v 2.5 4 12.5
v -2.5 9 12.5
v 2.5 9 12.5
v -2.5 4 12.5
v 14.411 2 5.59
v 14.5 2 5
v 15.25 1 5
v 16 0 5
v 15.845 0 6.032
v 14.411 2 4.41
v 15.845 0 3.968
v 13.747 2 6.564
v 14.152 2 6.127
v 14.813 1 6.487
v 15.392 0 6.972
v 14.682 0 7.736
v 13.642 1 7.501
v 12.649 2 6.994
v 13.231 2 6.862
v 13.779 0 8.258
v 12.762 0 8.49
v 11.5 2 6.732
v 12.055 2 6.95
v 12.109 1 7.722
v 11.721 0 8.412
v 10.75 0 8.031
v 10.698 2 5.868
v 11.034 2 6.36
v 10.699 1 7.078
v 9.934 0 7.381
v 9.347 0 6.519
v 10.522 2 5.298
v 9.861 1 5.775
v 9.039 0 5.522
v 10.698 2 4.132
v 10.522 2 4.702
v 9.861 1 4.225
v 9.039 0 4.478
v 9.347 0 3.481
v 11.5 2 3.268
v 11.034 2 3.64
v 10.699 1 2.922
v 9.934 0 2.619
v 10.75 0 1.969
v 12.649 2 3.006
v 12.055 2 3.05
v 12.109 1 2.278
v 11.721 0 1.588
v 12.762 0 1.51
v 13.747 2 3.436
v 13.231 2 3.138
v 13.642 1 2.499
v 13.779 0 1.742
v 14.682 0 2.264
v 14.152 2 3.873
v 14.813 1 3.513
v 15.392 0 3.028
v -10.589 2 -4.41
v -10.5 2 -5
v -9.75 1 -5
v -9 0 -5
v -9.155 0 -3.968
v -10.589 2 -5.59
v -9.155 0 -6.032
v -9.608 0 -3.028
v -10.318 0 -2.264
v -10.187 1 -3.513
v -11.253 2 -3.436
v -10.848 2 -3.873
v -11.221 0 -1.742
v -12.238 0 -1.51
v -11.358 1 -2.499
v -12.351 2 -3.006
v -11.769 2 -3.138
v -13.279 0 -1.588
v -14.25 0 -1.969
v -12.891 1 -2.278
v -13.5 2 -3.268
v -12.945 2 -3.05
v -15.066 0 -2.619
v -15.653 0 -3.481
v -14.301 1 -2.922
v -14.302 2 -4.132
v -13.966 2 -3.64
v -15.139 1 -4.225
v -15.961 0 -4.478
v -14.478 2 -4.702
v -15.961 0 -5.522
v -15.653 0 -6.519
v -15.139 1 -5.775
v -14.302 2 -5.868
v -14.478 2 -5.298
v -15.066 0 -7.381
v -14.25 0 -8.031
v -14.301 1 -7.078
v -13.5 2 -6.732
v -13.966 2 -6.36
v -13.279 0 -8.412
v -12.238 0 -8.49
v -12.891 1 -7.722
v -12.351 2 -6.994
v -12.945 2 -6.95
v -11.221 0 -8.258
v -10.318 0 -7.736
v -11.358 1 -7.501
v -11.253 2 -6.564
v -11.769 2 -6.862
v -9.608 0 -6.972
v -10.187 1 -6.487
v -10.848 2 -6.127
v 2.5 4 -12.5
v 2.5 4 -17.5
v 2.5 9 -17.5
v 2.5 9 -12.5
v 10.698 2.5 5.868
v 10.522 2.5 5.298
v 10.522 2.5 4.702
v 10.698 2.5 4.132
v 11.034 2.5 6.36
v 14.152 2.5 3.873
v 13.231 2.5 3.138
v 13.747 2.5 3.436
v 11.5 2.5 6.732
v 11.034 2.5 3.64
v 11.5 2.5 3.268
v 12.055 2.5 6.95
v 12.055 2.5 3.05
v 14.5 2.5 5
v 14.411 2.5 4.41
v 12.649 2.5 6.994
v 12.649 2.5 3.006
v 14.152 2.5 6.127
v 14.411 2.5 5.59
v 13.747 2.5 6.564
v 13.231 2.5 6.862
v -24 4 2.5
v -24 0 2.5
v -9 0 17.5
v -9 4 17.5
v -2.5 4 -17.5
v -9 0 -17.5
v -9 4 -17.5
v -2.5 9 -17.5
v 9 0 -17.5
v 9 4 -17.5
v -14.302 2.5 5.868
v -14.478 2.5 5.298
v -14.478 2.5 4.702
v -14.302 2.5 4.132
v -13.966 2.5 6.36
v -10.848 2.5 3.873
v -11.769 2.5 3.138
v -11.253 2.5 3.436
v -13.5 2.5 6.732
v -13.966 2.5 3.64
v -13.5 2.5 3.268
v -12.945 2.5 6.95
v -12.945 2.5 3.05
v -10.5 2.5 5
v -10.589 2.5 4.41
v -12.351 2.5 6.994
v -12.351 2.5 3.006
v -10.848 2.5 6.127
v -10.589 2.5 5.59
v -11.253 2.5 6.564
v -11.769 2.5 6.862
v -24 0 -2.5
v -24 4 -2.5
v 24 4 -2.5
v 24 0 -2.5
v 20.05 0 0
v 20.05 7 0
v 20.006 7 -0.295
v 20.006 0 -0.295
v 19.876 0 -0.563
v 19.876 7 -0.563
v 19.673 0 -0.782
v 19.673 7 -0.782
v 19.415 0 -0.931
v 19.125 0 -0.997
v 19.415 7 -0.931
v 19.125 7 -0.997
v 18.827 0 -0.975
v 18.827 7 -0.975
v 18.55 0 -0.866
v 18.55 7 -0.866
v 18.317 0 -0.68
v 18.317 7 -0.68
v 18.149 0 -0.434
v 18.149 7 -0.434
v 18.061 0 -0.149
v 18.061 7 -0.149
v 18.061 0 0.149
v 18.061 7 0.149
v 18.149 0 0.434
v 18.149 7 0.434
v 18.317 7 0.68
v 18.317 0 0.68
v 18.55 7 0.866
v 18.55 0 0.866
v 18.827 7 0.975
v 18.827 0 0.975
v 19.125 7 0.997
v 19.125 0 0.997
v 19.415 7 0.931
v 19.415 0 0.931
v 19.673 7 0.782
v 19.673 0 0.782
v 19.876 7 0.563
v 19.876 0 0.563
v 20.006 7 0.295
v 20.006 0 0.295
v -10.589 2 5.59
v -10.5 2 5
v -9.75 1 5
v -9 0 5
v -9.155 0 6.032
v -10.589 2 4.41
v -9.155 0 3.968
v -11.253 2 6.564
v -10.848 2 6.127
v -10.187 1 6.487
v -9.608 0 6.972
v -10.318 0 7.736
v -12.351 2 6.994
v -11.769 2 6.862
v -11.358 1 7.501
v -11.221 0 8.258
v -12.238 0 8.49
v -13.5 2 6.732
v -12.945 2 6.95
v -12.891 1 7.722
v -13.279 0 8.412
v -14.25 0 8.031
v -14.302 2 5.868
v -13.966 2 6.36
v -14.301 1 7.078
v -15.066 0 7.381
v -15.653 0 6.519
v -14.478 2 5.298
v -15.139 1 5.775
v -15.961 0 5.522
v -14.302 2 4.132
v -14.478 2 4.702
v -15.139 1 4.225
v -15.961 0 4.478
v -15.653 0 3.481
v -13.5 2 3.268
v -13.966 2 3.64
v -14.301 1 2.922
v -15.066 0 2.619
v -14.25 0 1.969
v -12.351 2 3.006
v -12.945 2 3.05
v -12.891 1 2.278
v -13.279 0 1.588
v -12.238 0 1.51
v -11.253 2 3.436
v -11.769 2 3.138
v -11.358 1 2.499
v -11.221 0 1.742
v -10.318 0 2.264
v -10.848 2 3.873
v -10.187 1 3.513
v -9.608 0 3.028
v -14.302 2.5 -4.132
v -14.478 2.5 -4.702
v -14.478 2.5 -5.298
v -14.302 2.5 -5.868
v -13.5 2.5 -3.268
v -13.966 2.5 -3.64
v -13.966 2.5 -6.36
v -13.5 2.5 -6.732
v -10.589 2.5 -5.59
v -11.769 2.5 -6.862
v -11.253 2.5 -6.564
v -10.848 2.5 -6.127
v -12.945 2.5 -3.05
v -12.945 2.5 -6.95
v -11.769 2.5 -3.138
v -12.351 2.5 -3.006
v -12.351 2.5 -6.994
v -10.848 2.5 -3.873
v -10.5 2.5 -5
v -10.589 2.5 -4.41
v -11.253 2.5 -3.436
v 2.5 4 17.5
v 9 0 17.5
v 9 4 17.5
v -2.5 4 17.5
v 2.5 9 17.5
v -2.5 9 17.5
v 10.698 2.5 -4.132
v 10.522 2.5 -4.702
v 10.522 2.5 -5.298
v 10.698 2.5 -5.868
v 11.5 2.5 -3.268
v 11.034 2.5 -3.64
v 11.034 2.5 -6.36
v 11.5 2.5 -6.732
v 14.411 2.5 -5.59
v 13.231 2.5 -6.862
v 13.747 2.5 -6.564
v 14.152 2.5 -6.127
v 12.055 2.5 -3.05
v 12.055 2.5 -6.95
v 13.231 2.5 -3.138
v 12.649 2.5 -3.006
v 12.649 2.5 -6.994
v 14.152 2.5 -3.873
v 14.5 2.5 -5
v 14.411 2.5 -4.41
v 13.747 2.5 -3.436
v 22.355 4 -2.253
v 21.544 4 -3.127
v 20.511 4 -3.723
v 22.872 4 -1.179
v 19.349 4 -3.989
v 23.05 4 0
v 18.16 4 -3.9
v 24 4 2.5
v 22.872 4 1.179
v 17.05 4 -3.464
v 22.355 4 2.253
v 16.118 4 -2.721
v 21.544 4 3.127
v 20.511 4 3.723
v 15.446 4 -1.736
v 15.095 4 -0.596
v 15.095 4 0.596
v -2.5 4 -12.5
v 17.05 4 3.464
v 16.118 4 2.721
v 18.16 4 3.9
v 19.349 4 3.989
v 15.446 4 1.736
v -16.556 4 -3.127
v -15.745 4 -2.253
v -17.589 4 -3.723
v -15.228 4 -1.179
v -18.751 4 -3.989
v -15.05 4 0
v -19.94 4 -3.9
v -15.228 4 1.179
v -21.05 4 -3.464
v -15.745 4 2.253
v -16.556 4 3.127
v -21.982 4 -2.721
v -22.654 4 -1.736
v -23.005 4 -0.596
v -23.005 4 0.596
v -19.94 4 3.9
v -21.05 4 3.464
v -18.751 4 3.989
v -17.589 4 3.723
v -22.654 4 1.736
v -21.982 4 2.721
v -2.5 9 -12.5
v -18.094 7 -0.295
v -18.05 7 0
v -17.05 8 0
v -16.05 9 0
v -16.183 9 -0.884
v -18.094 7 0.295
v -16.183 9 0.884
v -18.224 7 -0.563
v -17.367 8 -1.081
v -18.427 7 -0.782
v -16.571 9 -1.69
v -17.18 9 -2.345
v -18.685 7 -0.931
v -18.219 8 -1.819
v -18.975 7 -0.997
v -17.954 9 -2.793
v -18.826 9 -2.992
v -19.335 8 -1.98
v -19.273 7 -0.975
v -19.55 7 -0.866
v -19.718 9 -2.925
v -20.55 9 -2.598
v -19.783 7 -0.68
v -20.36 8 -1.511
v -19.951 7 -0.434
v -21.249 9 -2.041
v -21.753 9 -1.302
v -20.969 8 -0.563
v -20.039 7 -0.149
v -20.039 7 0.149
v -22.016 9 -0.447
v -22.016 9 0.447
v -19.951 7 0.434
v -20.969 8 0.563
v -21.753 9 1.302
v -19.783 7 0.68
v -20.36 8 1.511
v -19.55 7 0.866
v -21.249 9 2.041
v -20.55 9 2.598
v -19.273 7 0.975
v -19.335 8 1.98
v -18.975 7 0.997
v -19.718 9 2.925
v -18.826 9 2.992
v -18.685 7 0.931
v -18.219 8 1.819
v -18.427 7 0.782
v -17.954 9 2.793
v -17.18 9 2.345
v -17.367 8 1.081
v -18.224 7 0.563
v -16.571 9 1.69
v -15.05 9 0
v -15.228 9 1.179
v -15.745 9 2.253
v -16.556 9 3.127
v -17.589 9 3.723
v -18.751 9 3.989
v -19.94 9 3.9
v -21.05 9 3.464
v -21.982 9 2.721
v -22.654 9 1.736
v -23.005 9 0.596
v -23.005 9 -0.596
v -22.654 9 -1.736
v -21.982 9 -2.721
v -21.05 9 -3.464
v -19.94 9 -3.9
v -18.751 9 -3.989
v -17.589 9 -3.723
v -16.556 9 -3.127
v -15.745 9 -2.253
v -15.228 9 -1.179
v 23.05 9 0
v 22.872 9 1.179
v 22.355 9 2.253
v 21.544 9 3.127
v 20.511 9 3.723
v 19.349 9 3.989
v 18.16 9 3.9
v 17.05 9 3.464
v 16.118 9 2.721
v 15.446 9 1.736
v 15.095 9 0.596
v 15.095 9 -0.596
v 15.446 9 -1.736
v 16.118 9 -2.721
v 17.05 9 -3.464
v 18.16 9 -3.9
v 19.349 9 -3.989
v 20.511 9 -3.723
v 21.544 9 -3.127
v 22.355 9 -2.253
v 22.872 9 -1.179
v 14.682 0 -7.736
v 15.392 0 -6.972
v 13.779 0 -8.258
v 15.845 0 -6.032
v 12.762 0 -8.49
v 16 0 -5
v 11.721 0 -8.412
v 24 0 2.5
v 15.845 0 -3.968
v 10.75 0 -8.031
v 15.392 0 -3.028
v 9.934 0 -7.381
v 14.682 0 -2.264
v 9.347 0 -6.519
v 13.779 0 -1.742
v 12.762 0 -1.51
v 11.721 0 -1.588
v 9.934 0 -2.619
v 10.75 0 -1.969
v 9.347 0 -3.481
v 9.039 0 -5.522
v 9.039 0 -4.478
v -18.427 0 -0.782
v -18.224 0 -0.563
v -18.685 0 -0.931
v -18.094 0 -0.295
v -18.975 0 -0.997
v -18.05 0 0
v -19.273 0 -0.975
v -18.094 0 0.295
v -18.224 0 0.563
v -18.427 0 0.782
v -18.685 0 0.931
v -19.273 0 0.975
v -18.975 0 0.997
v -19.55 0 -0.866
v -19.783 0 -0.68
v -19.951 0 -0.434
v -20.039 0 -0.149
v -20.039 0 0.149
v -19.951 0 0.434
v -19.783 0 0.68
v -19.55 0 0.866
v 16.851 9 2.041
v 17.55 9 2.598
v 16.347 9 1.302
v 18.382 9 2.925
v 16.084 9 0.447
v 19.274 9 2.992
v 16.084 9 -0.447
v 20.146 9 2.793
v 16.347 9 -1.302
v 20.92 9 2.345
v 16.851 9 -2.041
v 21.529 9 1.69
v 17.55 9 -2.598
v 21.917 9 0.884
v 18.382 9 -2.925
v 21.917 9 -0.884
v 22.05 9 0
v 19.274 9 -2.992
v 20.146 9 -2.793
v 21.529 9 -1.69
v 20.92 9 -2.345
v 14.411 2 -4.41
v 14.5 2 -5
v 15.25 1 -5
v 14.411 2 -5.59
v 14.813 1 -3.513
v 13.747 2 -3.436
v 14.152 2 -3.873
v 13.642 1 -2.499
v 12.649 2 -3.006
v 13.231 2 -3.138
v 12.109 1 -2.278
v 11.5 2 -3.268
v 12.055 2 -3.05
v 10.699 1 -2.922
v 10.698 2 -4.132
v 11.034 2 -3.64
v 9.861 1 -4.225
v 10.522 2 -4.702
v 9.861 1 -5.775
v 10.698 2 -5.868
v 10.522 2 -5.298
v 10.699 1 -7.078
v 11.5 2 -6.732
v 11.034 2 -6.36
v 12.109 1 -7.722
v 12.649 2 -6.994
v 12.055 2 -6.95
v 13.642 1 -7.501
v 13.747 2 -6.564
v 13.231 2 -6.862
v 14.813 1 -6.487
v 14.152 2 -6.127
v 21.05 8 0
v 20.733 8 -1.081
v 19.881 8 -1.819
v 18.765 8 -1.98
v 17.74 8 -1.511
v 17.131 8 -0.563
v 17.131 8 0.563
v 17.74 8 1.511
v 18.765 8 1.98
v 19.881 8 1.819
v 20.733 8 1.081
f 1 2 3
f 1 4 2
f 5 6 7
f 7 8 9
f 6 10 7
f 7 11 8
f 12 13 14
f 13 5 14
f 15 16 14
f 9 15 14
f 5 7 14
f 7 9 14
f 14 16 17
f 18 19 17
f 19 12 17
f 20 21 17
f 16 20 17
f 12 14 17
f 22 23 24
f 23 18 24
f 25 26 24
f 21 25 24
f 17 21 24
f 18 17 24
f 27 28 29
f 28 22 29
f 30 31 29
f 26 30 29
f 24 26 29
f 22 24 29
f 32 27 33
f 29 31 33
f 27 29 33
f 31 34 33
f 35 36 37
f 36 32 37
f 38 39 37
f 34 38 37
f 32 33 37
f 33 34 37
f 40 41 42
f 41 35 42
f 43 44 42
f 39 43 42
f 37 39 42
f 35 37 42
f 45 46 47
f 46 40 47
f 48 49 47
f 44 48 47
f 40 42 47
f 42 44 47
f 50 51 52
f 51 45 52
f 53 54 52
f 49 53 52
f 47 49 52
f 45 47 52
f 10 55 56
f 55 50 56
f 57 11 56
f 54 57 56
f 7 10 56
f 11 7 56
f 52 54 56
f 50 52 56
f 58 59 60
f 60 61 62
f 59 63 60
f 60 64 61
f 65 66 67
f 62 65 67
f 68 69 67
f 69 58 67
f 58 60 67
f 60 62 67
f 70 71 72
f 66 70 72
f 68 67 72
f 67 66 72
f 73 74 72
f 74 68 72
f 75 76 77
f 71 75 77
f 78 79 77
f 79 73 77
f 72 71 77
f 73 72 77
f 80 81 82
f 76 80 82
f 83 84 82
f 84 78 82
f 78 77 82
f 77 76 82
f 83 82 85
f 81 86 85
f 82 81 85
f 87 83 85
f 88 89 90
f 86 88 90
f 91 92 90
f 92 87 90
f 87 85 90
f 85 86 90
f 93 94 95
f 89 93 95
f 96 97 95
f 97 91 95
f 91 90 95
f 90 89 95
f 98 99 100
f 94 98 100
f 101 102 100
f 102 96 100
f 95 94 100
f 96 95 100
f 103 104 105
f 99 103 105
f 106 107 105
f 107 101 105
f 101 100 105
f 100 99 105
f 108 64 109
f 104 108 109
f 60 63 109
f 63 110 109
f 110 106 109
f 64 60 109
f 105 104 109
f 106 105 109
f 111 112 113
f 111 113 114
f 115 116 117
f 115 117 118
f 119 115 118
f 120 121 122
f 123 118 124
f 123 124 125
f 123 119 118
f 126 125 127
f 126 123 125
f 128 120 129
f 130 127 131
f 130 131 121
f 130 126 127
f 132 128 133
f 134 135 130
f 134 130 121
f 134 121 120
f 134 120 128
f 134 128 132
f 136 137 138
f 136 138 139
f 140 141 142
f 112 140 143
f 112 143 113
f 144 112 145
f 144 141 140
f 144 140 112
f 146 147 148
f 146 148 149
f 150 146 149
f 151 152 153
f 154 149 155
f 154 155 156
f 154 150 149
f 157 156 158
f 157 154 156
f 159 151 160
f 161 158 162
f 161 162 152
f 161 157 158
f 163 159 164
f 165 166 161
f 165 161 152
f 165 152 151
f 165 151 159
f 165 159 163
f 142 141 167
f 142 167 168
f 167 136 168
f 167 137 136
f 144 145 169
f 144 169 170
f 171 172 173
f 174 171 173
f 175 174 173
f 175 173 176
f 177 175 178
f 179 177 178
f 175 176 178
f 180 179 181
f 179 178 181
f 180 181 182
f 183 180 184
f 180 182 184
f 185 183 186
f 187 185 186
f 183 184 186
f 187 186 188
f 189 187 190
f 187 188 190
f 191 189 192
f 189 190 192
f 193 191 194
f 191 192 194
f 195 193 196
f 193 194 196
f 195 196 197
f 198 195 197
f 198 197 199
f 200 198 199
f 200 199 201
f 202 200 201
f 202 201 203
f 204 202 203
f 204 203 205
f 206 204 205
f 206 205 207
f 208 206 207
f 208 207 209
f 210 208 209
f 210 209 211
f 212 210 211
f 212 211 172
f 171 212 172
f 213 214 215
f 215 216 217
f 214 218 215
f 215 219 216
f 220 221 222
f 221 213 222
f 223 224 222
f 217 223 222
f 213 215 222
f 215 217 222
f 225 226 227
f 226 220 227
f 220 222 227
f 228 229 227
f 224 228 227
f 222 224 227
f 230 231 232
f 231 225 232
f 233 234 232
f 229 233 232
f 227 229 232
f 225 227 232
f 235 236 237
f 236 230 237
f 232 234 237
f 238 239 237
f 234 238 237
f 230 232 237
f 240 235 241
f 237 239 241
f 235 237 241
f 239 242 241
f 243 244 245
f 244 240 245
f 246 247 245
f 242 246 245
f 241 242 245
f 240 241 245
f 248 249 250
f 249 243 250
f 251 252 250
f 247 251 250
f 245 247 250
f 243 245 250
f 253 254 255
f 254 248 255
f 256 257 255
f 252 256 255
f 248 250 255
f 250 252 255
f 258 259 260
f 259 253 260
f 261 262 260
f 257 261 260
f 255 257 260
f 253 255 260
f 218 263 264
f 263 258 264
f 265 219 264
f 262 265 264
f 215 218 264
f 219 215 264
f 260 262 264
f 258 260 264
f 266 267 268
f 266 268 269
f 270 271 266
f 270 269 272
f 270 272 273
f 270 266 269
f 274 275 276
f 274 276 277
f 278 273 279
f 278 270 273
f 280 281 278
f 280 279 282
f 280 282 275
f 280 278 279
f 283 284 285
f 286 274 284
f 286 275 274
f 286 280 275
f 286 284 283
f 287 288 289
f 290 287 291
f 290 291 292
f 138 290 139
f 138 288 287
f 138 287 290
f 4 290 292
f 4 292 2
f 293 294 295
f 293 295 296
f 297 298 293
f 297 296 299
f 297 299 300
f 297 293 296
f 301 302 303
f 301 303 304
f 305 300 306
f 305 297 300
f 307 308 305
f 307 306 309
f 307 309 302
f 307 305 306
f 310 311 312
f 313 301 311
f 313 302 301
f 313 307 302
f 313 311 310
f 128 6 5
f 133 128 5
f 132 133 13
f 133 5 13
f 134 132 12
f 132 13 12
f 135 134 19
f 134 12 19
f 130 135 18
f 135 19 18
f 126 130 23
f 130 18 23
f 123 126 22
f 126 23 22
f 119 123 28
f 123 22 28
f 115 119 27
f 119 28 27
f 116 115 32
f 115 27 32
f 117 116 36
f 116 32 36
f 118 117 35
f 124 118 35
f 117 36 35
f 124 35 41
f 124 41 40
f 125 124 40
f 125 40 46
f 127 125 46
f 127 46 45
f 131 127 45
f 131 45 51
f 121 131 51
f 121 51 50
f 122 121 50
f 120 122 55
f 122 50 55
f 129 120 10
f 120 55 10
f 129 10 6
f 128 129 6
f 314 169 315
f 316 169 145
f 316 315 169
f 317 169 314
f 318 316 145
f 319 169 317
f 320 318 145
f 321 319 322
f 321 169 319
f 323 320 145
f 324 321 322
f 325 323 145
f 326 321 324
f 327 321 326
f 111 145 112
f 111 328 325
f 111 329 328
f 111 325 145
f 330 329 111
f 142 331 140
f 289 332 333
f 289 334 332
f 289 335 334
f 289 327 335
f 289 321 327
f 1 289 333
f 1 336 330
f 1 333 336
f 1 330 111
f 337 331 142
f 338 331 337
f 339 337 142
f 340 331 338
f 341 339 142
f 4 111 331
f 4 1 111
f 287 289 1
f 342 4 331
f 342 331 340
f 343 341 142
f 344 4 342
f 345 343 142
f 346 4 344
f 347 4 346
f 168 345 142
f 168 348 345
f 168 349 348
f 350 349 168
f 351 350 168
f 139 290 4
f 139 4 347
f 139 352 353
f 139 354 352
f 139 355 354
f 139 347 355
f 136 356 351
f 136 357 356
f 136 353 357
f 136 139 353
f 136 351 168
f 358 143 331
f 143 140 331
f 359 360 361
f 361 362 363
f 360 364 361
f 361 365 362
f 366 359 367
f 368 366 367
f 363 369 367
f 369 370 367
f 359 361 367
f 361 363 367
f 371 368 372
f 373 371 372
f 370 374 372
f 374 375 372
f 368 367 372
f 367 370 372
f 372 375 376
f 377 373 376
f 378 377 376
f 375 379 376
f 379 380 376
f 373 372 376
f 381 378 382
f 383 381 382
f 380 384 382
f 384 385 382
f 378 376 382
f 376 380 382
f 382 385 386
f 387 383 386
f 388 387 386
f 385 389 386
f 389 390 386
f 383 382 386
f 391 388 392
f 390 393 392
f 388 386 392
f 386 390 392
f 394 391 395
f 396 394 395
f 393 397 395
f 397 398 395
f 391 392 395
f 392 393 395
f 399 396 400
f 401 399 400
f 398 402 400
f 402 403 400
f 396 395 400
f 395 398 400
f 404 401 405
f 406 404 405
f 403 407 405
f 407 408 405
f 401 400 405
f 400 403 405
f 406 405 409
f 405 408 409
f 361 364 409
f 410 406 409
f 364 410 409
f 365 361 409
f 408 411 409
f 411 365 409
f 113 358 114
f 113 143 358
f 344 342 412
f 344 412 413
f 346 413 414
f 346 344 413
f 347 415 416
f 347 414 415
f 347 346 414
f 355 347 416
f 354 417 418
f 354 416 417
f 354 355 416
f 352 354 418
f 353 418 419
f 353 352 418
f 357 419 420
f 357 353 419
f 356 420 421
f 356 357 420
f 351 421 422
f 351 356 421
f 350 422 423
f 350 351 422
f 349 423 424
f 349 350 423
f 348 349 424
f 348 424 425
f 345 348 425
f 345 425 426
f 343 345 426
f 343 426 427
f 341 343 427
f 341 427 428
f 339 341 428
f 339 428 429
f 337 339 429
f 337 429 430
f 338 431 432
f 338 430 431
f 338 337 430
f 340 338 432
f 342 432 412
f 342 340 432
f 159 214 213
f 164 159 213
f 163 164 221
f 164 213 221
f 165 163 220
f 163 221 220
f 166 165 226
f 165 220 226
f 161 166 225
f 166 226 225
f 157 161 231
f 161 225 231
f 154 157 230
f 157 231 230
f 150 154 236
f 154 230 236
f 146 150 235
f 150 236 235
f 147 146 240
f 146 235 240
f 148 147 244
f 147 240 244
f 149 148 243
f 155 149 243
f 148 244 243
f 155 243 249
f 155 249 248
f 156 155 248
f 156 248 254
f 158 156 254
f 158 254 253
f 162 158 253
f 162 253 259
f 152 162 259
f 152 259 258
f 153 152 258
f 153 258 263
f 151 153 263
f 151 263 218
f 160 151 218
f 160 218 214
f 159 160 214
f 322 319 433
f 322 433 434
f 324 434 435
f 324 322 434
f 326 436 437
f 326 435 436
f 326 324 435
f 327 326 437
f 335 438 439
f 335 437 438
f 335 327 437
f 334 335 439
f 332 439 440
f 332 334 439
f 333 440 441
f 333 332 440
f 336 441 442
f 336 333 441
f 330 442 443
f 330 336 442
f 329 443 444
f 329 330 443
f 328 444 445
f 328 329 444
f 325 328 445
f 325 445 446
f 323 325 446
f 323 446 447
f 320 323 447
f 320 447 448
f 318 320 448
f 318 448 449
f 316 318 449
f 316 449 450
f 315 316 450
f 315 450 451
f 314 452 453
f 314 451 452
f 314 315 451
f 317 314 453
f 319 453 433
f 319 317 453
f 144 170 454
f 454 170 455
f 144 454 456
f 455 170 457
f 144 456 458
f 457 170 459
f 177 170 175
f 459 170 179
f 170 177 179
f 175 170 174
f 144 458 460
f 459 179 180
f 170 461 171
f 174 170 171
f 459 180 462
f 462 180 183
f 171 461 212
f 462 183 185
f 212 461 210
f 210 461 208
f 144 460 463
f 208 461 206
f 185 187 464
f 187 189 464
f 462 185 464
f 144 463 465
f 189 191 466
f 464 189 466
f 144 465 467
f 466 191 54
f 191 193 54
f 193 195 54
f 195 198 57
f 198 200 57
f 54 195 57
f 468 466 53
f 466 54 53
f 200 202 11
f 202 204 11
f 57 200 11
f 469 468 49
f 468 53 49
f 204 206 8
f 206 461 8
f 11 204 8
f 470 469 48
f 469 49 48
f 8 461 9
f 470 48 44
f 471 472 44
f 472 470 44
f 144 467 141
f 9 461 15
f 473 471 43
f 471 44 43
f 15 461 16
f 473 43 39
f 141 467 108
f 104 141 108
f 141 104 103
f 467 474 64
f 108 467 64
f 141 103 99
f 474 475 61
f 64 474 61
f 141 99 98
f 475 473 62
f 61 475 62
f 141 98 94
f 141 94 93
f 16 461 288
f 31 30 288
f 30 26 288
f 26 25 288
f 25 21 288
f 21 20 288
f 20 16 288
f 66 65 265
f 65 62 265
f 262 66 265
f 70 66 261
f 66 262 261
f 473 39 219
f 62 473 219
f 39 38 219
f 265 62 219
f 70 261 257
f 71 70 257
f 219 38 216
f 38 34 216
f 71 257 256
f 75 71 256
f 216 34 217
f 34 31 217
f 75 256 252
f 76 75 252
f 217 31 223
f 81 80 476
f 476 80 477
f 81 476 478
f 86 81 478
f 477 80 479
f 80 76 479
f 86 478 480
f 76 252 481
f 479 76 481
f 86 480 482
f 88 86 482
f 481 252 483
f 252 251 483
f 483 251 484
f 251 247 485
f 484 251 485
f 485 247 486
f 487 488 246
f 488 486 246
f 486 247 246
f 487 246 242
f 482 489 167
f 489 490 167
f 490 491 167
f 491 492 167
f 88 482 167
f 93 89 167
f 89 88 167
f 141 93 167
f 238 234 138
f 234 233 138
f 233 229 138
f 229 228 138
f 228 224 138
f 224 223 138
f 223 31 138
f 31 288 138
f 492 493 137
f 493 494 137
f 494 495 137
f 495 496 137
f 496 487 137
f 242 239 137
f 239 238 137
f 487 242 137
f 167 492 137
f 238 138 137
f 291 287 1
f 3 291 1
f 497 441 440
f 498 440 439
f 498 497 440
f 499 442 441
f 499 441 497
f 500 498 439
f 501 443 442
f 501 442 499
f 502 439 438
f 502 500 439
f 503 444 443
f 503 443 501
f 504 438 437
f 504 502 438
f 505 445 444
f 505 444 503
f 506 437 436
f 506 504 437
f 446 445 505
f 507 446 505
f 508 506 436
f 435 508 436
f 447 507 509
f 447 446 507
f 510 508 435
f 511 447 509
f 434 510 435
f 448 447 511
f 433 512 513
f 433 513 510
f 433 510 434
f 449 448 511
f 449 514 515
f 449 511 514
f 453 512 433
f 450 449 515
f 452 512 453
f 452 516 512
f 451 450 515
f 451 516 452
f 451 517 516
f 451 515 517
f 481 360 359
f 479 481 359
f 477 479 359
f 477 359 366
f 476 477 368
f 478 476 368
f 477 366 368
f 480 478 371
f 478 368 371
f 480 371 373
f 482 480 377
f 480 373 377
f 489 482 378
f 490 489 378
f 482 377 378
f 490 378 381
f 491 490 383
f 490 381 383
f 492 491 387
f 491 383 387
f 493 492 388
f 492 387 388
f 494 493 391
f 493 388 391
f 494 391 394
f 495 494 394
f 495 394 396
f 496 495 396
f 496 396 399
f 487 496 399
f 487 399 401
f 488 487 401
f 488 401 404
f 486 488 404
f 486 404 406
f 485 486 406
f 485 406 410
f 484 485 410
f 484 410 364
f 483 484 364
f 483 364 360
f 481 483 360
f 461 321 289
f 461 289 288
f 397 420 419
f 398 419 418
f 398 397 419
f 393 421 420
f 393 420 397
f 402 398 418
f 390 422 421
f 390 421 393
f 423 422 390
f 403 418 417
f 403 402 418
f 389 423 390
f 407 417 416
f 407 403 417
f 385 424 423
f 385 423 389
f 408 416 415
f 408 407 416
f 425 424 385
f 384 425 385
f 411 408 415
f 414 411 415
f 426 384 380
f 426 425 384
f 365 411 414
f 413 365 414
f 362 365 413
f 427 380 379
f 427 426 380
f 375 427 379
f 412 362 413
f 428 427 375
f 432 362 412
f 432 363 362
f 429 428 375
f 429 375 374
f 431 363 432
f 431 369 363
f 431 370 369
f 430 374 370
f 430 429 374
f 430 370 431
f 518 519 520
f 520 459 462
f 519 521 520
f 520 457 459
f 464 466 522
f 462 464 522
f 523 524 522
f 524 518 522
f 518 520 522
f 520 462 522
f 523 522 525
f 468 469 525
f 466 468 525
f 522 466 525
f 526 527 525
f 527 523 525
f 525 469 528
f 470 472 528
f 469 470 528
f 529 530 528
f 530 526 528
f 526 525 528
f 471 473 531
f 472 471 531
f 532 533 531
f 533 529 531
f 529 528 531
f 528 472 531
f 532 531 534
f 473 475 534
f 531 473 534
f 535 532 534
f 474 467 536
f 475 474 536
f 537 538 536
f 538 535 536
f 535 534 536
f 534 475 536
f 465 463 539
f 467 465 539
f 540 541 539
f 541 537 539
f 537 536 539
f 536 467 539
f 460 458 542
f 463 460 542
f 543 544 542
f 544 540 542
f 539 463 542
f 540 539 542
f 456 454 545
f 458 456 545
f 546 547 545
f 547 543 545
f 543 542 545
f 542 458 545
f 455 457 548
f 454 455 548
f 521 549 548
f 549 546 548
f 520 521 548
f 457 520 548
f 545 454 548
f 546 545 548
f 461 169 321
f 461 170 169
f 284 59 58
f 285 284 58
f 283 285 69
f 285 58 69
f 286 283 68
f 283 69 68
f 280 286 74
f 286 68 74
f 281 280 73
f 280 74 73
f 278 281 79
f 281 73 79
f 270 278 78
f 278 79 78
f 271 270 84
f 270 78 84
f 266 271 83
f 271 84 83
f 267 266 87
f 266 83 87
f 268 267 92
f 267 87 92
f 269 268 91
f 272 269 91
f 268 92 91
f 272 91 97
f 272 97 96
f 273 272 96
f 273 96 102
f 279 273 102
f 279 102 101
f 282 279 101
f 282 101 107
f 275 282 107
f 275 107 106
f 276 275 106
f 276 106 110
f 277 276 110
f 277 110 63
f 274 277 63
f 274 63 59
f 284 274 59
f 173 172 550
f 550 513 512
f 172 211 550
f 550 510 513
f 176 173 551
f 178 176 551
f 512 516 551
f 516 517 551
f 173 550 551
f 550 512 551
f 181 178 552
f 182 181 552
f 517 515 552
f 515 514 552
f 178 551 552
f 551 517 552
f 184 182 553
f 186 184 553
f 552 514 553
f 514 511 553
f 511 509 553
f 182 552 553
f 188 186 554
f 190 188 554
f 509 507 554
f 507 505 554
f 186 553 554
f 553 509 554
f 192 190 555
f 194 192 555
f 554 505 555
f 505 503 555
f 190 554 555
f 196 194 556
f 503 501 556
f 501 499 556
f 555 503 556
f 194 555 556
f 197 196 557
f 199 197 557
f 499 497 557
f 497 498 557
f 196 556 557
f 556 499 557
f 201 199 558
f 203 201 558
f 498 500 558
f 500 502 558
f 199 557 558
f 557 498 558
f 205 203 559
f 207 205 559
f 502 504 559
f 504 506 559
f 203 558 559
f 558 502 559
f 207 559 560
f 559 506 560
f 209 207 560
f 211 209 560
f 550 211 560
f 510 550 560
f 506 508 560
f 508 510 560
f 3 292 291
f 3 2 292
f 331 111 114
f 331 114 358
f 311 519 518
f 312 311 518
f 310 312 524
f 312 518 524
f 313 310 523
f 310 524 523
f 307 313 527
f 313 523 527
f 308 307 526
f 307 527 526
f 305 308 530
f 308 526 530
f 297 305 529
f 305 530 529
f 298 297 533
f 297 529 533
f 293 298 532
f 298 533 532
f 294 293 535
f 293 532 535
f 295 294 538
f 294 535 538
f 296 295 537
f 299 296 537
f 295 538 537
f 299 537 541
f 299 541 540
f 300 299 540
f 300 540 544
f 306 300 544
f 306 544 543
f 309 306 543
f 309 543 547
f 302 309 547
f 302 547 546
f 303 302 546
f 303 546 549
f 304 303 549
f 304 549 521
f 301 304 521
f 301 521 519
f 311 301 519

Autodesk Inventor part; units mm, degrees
ref_plane "YZ Plane" through (0, 0, 0) normal (1, 0, 0) x (0, 1, 0)
ref_plane "XZ Plane" through (0, 0, 0) normal (0, 1, 0) x (-1, 0, 0)
ref_plane "XY Plane" through (0, 0, 0) normal (0, 0, 1) x (1, 0, 0)
sketch "Sketch1" plane through (0, 0, 0) normal (0, 1, 0) x (-1, 0, 0)
  line L0 (-24, 17.5) -> (24, 17.5)
  line L1 (24, 17.5) -> (24, -17.5)
  line L2 (24, -17.5) -> (-24, -17.5)
  line L3 (-24, -17.5) -> (-24, 17.5)
  line L4 (-24, 17.5) -> (24, -17.5) construction
  line L5 (24, 17.5) -> (-24, -17.5) construction
  point P0 (0, 0)
  dimension "d0" = 48
  dimension "d1" = 35
extrude "Extrusion1" add sketch "Sketch1" along normal blind 4
sketch "Sketch2" plane through (0, 4, 0) normal (0, 1, 0) x (1, 0, 0)
  line L0 (0, 0) -> (-5.2635, 0) construction
  line L1 (-5.2635, 0) -> (-5.2635, 9.5172) construction
  line L2 (-5.2635, 9.5172) -> (0, 9.5172) construction
  line L3 (0, 9.5172) -> (0, 0) construction
  circle A0 centre (-19.05, 0) radius 1
  circle A1 centre (19.05, 0) radius 1
  circle A2 centre (-19.05, 0) radius 4
  circle A3 centre (19.05, 0) radius 4
  line L4 (-24, -17.5) -> (24, -17.5) projected
  line L5 (0, -17.5) -> (-2.5, -17.5)
  line L6 (-2.5, -17.5) -> (-2.5, -12.5)
  line L7 (-2.5, -12.5) -> (0, -12.5)
  line L8 (0, -12.5) -> (0, -17.5)
  line L9 (2.5, -17.5) -> (2.5, -12.5)
  line L10 (2.5, -12.5) -> (0, -12.5)
  line L11 (-2.5, 17.5) -> (-2.5, 12.5)
  line L12 (-2.5, 12.5) -> (0, 12.5)
  line L13 (2.5, 17.5) -> (2.5, 12.5)
  line L14 (2.5, 12.5) -> (0, 12.5)
  line L15 (24, 17.5) -> (-24, 17.5) projected
  dimension "d4" = 2
  dimension "d5" = 19.05
  dimension "d6" = 3
  dimension "d7" = 3
  dimension "d8" = 2.5
  dimension "d9" = 5
extrude "Extrusion2" add sketch "Sketch2" along normal blind 5
chamfer "Chamfer1" distance 15 angle 45 4 edges at (24, 2, -17.5) (24, 2, 17.5) (-24, 2, 17.5) (-24, 2, -17.5)
sketch "Sketch4" plane through (19.05, 9, 0) normal (0, 1, 0) x (1, 0, 0)
  circle A0 centre (0, 0) radius 1 projected
  circle A1 centre (-38.1, 0) radius 1 projected
  point P0 (-19.05, 0)
extrude "Extrusion3" cut sketch "Sketch4" against normal through all
sketch "Sketch7" plane through (0, 0, 0) normal (0, -1, 0) x (1, 0, 0)
  line L0 (14.5, -3) -> (10.5, -3)
  line L1 (10.5, -3) -> (10.5, -7)
  line L2 (10.5, -7) -> (14.5, -7)
  line L3 (14.5, -7) -> (14.5, -3)
  line L4 (0, -6.5734) -> (0, 0) construction
  line L5 (0, 0) -> (6.1677, 0) construction
  line L6 (-14.5, -3) -> (-10.5, -3)
  line L7 (-10.5, -3) -> (-10.5, -7)
  line L8 (-10.5, -7) -> (-14.5, -7)
  line L9 (-14.5, -7) -> (-14.5, -3)
  line L10 (14.5, 3) -> (10.5, 3)
  line L11 (10.5, 3) -> (10.5, 7)
  line L12 (10.5, 7) -> (14.5, 7)
  line L13 (14.5, 7) -> (14.5, 3)
  line L14 (-10.5, 7) -> (-14.5, 7)
  line L15 (-10.5, 3) -> (-10.5, 7)
  line L16 (-14.5, 3) -> (-10.5, 3)
  line L17 (-14.5, 7) -> (-14.5, 3)
  circle A0 centre (12.5, -5) radius 2
  circle A1 centre (-12.5, -5) radius 2
  circle A2 centre (12.5, 5) radius 2
  circle A3 centre (-12.5, 5) radius 2
  point P0 (12.5, -7)
  point P1 (10.5, -5)
  point P2 (12.5, 7)
  point P3 (10.5, 5)
  point P4 (12.5, -3)
  dimension "d30" = 12.5
  dimension "d31" = 4
  dimension "d32" = 4
  dimension "d33" = 5
extrude "Extrusion6" cut sketch "Sketch7" against normal blind 2.5 contours A0 | A1 | A2 | A3
chamfer "Chamfer3" distance 1.5 distance2 2 4 edges at (10.5, 0, 5) (10.5, 0, -5) (-14.5, 0, -5) (-14.5, 0, 5) measured on face at (3, 0, -9.7863)
chamfer "Chamfer4" distance 2 angle 45 2 edges at (-20.05, 9, 0) (18.05, 9, 0)
equation "\"d32\" = d31"
properties part number "Base"
